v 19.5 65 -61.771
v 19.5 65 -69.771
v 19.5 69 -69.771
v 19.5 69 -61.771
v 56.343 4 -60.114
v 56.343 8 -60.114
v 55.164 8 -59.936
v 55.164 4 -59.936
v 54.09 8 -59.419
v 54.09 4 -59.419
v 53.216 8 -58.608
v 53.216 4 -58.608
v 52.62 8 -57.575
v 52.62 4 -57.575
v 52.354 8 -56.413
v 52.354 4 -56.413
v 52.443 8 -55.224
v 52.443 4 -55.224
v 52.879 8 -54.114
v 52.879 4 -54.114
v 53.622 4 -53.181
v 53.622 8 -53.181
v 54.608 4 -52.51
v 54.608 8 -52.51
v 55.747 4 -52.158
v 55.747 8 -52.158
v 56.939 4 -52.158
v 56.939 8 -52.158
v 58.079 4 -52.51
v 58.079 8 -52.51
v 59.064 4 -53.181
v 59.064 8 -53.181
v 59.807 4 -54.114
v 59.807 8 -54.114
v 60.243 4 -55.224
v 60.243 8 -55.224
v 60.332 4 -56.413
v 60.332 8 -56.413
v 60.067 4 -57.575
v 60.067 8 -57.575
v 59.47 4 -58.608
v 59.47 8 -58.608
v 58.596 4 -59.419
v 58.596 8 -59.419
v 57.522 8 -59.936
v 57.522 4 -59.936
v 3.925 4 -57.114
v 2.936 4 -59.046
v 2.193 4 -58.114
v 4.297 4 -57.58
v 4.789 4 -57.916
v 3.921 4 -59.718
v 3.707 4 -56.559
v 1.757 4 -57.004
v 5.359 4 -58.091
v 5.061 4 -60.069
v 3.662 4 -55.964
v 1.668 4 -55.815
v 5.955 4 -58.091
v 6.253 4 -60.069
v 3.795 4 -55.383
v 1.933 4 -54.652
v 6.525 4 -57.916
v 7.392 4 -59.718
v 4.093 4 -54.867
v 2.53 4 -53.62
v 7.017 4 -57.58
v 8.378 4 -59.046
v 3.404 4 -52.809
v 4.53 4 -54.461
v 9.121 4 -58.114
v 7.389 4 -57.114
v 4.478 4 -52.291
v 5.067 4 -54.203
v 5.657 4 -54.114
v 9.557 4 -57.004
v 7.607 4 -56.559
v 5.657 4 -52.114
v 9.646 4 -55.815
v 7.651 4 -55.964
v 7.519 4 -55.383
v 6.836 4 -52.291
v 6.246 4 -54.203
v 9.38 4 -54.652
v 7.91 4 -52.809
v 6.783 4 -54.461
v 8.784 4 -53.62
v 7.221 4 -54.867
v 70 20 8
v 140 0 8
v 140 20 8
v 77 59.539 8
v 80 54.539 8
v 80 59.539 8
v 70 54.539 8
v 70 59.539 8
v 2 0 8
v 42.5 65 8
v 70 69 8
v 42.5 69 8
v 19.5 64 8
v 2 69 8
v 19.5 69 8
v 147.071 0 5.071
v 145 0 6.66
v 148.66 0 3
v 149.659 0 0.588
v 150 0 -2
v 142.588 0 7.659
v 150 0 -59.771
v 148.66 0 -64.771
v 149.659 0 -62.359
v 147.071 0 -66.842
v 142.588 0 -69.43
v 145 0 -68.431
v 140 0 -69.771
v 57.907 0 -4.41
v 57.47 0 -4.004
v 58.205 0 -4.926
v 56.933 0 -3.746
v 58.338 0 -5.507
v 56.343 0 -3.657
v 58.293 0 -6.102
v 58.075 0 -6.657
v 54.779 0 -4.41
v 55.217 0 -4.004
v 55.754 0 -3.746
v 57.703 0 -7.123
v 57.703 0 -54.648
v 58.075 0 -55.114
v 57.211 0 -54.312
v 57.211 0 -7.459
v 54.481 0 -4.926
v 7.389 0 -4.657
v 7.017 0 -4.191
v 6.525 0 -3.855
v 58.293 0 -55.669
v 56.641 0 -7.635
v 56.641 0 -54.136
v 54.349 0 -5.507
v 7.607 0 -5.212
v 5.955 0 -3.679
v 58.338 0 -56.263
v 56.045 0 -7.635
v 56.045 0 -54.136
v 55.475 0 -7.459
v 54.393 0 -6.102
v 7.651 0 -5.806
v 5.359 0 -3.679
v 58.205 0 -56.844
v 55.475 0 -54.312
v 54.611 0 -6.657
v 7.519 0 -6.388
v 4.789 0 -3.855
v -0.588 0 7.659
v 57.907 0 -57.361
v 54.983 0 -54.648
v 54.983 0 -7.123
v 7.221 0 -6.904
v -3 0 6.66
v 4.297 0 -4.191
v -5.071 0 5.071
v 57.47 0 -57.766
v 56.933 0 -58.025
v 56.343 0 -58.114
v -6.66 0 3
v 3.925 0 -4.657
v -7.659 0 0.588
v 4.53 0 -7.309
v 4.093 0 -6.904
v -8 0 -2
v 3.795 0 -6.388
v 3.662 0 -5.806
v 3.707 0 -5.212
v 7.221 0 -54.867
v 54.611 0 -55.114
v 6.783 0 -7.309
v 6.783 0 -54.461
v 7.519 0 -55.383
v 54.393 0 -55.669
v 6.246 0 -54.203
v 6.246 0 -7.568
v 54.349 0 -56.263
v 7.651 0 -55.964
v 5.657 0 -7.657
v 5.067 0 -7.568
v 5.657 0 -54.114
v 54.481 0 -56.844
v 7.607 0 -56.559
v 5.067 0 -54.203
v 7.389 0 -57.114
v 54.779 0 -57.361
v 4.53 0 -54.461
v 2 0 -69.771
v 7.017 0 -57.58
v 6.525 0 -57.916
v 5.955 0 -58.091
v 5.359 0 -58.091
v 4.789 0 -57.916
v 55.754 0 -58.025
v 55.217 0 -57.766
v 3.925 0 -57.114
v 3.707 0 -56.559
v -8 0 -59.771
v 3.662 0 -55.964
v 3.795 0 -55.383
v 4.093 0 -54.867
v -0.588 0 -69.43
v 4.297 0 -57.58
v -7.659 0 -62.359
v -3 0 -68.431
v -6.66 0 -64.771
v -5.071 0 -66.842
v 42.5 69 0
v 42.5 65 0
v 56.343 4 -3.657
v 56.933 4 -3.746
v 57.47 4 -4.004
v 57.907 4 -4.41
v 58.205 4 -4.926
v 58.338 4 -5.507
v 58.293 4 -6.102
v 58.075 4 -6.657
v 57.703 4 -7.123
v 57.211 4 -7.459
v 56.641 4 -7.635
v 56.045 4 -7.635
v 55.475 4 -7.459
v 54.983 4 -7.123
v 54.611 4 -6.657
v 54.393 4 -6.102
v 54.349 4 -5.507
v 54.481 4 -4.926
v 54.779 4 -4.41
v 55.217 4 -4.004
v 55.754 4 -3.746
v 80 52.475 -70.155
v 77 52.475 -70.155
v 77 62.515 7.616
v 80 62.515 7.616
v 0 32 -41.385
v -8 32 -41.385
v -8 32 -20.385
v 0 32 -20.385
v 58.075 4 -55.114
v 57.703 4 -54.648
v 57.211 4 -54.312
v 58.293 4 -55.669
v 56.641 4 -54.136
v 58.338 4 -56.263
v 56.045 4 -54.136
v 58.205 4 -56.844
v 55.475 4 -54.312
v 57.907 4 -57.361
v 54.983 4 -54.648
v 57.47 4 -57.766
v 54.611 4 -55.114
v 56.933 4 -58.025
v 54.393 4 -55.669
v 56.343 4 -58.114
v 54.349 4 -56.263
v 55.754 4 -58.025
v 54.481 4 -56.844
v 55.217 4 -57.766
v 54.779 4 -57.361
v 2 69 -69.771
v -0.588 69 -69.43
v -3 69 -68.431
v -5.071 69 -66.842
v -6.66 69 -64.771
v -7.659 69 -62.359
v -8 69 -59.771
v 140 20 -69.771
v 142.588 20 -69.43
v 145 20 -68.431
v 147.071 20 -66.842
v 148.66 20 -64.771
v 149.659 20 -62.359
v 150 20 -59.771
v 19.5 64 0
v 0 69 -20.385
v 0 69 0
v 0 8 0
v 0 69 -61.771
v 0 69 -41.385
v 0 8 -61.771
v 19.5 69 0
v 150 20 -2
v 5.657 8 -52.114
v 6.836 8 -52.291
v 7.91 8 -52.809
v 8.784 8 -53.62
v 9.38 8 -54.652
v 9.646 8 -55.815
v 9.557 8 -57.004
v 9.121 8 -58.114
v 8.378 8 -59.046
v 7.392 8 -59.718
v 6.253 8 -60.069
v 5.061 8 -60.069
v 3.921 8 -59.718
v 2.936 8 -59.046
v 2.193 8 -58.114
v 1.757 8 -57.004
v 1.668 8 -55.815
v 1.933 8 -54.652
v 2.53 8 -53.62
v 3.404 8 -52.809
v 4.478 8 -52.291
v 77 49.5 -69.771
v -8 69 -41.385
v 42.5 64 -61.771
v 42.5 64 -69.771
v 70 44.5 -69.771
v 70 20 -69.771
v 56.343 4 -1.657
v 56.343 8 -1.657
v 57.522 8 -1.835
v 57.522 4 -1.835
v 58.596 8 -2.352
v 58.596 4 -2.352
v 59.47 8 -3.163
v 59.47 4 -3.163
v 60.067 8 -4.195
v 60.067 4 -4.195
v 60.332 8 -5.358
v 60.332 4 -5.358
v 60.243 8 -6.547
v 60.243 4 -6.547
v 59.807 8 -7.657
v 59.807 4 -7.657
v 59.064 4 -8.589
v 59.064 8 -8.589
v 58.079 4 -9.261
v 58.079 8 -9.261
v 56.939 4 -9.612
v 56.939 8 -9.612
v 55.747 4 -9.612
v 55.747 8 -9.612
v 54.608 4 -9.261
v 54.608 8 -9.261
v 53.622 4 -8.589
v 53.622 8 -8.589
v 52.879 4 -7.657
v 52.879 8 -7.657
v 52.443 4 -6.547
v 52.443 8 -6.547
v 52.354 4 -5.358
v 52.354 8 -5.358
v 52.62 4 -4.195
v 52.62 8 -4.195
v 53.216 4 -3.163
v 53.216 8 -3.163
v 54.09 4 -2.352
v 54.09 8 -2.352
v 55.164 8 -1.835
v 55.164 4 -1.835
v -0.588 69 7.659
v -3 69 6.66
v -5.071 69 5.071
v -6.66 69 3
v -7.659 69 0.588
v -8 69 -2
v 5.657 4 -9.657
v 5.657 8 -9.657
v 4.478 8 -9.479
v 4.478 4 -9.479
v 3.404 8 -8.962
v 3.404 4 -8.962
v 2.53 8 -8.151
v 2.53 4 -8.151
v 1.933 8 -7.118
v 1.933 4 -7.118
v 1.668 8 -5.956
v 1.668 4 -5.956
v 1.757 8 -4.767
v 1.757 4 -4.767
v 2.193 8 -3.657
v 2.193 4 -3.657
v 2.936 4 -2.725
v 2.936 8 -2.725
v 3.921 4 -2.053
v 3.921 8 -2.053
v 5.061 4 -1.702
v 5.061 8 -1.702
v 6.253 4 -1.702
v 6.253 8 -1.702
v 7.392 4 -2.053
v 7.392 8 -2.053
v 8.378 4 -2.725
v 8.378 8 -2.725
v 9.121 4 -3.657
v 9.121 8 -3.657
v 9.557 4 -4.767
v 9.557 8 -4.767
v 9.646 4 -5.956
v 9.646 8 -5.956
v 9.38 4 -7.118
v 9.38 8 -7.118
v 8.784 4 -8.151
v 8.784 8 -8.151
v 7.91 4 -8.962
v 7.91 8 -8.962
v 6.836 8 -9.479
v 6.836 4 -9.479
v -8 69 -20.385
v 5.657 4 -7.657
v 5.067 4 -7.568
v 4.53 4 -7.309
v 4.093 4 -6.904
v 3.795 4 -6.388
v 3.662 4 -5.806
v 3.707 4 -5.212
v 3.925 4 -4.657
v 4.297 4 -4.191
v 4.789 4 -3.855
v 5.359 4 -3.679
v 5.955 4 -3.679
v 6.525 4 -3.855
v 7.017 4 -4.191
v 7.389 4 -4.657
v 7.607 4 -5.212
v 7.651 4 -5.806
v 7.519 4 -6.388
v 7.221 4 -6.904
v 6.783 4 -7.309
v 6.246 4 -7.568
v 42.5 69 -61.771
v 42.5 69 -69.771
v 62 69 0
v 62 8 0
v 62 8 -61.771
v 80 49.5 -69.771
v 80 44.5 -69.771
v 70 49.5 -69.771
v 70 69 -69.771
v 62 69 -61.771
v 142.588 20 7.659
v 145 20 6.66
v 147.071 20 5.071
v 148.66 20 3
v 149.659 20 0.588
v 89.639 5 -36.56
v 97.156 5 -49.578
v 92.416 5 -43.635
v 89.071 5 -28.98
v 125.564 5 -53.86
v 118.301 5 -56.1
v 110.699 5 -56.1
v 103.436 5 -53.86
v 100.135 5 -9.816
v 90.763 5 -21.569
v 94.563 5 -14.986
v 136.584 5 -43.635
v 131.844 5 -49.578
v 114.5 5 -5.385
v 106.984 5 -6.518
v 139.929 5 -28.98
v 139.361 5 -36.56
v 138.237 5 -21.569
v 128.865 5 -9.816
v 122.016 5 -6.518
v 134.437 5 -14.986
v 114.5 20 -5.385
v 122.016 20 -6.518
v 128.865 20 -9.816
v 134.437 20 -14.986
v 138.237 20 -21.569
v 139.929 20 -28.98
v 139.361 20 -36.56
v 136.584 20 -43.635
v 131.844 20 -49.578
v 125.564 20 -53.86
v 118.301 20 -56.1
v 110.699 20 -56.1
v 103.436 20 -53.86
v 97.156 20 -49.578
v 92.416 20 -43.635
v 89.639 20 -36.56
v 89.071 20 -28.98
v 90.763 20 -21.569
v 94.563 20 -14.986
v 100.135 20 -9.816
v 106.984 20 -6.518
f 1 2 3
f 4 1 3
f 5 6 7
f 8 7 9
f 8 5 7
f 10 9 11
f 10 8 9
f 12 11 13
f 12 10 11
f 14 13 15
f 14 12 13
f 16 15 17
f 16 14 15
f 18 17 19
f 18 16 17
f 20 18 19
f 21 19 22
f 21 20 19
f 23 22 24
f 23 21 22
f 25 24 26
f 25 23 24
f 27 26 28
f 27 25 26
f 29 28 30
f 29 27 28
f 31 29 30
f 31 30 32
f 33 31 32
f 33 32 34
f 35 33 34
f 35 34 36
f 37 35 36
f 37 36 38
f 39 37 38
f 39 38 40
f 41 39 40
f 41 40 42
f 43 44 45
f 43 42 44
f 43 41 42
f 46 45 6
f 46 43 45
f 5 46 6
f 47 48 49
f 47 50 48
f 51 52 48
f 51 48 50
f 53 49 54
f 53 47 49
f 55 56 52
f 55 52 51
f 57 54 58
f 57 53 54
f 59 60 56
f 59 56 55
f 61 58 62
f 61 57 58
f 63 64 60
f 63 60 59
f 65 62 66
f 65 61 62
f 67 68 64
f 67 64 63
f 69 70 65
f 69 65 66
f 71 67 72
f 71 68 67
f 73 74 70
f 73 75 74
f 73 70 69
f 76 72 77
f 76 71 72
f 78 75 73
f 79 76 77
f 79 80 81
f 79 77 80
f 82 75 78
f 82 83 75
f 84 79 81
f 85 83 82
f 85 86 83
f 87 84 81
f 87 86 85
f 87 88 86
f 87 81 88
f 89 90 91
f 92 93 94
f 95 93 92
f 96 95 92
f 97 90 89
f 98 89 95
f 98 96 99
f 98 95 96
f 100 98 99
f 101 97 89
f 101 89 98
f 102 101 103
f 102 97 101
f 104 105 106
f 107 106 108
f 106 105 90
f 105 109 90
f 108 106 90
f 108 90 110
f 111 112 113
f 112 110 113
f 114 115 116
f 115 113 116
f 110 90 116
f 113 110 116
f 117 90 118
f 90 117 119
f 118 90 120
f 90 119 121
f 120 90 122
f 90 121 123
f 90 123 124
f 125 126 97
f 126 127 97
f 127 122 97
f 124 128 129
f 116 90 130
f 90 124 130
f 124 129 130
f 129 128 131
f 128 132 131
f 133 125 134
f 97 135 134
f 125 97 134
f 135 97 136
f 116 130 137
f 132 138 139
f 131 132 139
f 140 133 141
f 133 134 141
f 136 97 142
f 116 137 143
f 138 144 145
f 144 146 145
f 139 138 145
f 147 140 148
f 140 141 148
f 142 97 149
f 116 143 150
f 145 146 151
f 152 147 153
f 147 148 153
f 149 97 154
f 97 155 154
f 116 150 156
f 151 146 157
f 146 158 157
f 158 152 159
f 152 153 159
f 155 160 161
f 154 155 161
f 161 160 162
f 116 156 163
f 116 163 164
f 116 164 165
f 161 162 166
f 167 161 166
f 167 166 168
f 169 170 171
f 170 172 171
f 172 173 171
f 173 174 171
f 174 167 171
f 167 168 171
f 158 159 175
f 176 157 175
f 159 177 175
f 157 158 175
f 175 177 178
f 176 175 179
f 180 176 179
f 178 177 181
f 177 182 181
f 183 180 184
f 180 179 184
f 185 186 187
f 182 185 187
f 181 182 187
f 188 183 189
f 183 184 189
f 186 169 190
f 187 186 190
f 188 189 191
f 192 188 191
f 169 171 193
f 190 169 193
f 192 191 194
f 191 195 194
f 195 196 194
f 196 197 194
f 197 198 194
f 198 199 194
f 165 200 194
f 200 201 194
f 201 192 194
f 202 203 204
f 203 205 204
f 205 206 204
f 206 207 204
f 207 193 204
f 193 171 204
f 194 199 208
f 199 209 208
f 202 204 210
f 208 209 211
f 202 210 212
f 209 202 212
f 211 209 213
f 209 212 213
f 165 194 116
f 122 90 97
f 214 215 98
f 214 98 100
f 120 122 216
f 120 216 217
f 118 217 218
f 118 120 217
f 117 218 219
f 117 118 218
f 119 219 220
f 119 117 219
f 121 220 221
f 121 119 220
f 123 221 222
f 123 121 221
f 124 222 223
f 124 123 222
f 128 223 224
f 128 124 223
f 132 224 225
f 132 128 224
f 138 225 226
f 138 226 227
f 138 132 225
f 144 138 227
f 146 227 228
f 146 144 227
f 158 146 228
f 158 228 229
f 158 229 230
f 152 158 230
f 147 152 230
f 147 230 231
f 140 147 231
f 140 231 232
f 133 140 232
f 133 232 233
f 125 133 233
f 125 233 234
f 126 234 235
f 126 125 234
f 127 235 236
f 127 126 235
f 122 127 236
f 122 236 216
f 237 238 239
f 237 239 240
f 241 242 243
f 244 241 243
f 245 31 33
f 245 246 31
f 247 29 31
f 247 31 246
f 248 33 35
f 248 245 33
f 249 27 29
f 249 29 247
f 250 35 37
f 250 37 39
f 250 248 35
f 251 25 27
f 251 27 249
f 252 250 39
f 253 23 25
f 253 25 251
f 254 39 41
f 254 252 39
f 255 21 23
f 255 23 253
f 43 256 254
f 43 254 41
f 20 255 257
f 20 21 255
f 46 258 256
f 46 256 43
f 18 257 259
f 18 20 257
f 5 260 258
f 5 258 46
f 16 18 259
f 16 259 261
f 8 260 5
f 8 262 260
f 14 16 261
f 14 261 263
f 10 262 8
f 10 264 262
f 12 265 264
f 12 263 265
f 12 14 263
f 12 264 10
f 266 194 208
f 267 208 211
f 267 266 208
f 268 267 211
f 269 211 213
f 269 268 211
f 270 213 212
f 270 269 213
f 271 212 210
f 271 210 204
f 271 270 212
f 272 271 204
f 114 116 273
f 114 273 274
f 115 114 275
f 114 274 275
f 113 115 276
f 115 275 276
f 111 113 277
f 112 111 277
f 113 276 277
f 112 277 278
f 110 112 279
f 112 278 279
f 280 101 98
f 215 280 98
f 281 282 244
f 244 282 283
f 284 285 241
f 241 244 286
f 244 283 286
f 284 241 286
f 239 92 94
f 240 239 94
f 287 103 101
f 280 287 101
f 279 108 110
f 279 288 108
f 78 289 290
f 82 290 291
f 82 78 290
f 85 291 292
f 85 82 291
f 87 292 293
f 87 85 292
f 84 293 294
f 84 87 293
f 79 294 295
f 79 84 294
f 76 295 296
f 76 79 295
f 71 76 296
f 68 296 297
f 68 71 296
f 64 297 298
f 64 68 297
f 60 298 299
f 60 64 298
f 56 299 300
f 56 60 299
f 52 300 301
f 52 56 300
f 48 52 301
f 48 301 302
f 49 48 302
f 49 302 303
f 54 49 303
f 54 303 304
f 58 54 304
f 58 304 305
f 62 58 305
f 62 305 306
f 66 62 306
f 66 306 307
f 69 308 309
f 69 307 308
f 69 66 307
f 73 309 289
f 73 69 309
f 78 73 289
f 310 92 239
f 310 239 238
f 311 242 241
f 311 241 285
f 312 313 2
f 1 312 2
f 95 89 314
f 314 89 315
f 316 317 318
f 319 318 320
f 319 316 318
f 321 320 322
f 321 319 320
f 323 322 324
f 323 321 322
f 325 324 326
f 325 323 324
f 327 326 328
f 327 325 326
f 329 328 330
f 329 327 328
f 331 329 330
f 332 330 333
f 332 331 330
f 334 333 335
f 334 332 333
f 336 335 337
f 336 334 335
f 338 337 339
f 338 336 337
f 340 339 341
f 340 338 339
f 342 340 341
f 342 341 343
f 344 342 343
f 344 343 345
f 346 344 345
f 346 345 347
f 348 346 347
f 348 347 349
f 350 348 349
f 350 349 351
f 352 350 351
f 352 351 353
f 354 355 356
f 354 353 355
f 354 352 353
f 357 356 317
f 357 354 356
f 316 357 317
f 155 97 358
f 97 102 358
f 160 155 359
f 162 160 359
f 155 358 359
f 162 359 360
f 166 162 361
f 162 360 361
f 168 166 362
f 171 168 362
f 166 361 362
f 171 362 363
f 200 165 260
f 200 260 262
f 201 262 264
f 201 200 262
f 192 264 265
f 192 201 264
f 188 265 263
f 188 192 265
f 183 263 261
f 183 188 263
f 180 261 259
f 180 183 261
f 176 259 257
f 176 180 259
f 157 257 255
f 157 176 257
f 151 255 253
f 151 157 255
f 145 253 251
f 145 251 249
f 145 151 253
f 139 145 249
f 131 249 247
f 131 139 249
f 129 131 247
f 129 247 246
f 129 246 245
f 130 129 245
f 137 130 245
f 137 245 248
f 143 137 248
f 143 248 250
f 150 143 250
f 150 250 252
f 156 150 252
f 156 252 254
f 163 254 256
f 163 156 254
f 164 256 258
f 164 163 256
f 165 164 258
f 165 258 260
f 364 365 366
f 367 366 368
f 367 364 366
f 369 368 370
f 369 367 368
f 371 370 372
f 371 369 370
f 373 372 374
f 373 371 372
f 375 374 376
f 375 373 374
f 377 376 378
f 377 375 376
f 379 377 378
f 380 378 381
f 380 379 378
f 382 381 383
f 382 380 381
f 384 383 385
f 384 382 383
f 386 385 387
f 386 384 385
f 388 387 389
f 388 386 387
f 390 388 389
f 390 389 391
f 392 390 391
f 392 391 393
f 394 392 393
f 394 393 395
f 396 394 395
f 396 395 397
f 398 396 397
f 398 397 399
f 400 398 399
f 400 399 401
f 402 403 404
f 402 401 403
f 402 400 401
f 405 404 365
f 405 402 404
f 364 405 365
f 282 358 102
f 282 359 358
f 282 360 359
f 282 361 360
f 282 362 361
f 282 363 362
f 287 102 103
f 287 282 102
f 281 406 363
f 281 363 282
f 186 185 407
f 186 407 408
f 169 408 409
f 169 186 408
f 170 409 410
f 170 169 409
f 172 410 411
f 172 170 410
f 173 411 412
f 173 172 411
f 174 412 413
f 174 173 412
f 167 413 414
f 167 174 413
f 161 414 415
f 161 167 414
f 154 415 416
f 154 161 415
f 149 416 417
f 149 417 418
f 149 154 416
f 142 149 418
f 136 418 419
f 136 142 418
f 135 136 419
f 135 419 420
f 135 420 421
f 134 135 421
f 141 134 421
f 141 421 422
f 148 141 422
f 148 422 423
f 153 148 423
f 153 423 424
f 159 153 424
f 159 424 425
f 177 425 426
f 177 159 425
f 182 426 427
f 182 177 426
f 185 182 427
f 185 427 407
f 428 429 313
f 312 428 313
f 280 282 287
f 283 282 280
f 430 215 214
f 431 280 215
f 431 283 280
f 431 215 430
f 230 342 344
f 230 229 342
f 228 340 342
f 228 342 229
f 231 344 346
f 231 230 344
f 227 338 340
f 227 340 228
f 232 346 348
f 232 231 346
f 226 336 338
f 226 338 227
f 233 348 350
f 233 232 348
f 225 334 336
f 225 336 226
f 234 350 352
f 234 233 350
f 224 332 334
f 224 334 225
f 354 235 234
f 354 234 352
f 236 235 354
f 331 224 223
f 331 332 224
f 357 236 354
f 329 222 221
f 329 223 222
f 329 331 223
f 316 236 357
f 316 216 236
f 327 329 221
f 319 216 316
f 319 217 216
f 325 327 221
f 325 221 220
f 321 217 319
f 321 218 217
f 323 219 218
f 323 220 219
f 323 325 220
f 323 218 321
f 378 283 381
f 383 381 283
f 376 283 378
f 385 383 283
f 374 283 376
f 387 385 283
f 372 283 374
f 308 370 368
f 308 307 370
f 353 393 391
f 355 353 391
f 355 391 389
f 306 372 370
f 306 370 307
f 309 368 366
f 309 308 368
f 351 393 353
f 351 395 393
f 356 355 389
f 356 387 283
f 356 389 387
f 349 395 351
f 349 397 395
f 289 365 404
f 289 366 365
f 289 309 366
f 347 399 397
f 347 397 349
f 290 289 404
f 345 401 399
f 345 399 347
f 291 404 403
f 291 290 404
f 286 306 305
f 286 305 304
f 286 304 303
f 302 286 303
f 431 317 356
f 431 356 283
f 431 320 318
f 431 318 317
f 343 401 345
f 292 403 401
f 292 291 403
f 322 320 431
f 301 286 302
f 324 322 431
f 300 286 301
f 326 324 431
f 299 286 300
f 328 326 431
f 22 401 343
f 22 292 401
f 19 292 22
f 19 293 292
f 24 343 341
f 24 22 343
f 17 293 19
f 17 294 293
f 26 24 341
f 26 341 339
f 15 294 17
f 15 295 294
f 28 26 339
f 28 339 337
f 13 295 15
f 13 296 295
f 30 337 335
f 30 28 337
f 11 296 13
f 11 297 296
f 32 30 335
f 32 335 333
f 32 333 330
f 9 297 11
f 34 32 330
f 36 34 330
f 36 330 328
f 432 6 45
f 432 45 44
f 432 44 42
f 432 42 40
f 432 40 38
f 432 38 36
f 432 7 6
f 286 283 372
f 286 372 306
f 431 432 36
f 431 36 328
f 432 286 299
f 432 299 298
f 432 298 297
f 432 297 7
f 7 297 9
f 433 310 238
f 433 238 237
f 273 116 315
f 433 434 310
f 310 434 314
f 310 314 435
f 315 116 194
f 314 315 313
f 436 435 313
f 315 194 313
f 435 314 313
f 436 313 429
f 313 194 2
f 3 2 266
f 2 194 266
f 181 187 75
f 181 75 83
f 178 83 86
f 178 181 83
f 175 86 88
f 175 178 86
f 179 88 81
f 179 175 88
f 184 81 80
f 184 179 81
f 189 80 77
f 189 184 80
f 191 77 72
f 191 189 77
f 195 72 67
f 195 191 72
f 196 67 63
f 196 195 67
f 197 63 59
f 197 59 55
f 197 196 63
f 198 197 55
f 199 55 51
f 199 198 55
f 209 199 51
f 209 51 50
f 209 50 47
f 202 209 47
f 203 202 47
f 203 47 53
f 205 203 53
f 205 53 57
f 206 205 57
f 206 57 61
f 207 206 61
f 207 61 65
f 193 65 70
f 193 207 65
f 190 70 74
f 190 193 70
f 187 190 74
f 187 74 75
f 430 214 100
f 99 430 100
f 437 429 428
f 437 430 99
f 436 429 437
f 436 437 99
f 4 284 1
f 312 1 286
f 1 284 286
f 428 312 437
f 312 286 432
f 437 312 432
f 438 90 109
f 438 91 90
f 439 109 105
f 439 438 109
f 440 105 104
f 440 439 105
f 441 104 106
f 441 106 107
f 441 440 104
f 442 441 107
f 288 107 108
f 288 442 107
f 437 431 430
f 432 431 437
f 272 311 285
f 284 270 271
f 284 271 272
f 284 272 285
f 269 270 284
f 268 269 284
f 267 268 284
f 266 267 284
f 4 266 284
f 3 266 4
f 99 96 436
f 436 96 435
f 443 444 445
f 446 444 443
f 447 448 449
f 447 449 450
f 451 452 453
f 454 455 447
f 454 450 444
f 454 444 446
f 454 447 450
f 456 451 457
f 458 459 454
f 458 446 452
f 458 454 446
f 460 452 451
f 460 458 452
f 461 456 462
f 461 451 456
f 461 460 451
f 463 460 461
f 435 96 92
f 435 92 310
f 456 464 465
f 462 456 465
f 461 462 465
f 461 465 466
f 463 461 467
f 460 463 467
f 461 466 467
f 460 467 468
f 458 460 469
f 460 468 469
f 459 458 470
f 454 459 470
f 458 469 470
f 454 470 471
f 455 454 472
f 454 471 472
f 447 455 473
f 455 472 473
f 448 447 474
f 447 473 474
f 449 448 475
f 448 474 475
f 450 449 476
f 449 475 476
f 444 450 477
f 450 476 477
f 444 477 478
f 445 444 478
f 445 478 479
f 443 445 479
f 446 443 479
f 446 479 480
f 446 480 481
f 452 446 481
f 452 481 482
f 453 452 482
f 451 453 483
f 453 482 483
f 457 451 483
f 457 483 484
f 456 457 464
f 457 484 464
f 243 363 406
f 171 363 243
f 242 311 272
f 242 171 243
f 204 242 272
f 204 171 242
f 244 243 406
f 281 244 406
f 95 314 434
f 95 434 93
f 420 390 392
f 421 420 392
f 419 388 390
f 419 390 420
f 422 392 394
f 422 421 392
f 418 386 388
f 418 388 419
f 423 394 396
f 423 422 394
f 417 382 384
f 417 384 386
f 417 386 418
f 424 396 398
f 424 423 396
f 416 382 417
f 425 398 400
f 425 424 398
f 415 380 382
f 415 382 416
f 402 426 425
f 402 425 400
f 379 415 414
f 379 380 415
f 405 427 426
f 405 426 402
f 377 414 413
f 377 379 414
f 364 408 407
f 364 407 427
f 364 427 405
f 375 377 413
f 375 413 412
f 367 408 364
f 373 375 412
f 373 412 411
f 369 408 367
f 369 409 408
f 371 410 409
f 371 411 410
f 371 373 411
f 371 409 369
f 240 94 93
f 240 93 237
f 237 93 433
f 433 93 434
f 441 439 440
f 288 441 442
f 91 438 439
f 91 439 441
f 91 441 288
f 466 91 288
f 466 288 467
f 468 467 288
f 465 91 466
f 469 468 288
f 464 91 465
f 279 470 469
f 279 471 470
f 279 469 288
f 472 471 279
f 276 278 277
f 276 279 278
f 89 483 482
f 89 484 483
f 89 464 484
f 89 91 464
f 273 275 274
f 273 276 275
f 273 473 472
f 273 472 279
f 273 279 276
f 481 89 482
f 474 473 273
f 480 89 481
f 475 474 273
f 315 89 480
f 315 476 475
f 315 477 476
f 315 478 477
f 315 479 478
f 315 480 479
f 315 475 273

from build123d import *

# Parameters (mm, degrees)
SKETCH1_W            = 62
SKETCH1_H            = 61.770504471
BOSS_EXTRUDE6_DEPTH  = 8
SKETCH1_15_W         = 78
SKETCH1_15_H         = 77.770504471
SKETCH1_15_W_2       = 62
SKETCH1_15_H_2       = 61.770504471
BOSS_EXTRUDE9_DEPTH  = 69
SKETCH1_17_R         = 4
CUT_EXTRUDE2_DEPTH   = 56
SKETCH1_18_R         = 4
SKETCH1_18_R_2       = 2
BOSS_EXTRUDE10_DEPTH = 4
CUT_EXTRUDE10_DEPTH  = 8
CUT_EXTRUDE11_DEPTH  = 8
SKETCH6_W            = 21
SKETCH6_H            = 37
CUT_EXTRUDE13_DEPTH  = 10
SKETCH12_W           = 77.770504471
SKETCH12_H           = 20
BOSS_EXTRUDE12_DEPTH = 80
BOSS_EXTRUDE13_DEPTH = 10
SKETCH14_W           = 3
SKETCH14_H           = 78.415811308
BOSS_EXTRUDE14_DEPTH = 3
SKETCH15_R           = 25.5
CUT_EXTRUDE14_DEPTH  = 15
FILLET1_R            = 10


with BuildPart() as part:
    # Sketch1 → Boss-Extrude6 (new body)
    with BuildSketch(Plane(origin=(0, 0, 0), x_dir=(1, 0, 0), z_dir=(0, 1, 0))):
        with Locations((31, 30.885252236)):
            Rectangle(SKETCH1_W, SKETCH1_H)
    extrude(amount=BOSS_EXTRUDE6_DEPTH)

    # Sketch1<15> → Boss-Extrude9 (add)
    with BuildSketch(Plane(origin=(0, 0, 0), x_dir=(1, 0, 0), z_dir=(0, 1, 0))):
        with Locations((31, 30.885252236)):
            Rectangle(SKETCH1_15_W, SKETCH1_15_H)
        with Locations((31, 30.885252236)):
            Rectangle(SKETCH1_15_W_2, SKETCH1_15_H_2, mode=Mode.SUBTRACT)
    extrude(amount=BOSS_EXTRUDE9_DEPTH)

    # Sketch1<17> → Cut-Extrude2 (cut)
    with BuildSketch(Plane(origin=(0, 0, 0), x_dir=(1, 0, 0), z_dir=(0, 1, 0))):
        with Locations((5.656854249, 56.113650222)):
            Circle(SKETCH1_17_R)
        with Locations((56.343145751, 56.113650222)):
            Circle(SKETCH1_17_R)
        with Locations((56.343145751, 5.656854249)):
            Circle(SKETCH1_17_R)
        with Locations((5.656854249, 5.656854249)):
            Circle(SKETCH1_17_R)
    extrude(amount=CUT_EXTRUDE2_DEPTH, mode=Mode.SUBTRACT)

    # Sketch1<18> → Boss-Extrude10 (add)
    # profile 1 of 4: a face of its own
    with BuildSketch(Plane(origin=(0, 0, 0), x_dir=(1, 0, 0), z_dir=(0, 1, 0))):
        with Locations((5.656854249, 56.113650222)):
            Circle(SKETCH1_18_R)
        with Locations((5.656854249, 56.113650222)):
            Circle(SKETCH1_18_R_2, mode=Mode.SUBTRACT)
    # profile 2 of 4: a face of its own
    with BuildSketch(Plane(origin=(0, 0, 0), x_dir=(1, 0, 0), z_dir=(0, 1, 0))):
        with Locations((56.343145751, 56.113650222)):
            Circle(SKETCH1_18_R)
        with Locations((56.343145751, 56.113650222)):
            Circle(SKETCH1_18_R_2, mode=Mode.SUBTRACT)
    # profile 3 of 4: a face of its own
    with BuildSketch(Plane(origin=(0, 0, 0), x_dir=(1, 0, 0), z_dir=(0, 1, 0))):
        with Locations((56.343145751, 5.656854249)):
            Circle(SKETCH1_18_R)
        with Locations((56.343145751, 5.656854249)):
            Circle(SKETCH1_18_R_2, mode=Mode.SUBTRACT)
    # profile 4 of 4: a face of its own
    with BuildSketch(Plane(origin=(0, 0, 0), x_dir=(1, 0, 0), z_dir=(0, 1, 0))):
        with Locations((5.656854249, 5.656854249)):
            Circle(SKETCH1_18_R)
        with Locations((5.656854249, 5.656854249)):
            Circle(SKETCH1_18_R_2, mode=Mode.SUBTRACT)
    extrude(amount=BOSS_EXTRUDE10_DEPTH)

    # Sketch3 → Cut-Extrude10 (cut)
    with BuildSketch(Plane(origin=(0, 0, -69.770504471), x_dir=(-1, 0, 0), z_dir=(0, 0, -1))):
        Polygon((-42.5, 69), (-42.5, 64), (-19.5, 65), (-19.5, 69), align=None)
    extrude(amount=-CUT_EXTRUDE10_DEPTH, mode=Mode.SUBTRACT)

    # Sketch9 → Cut-Extrude11 (cut)
    with BuildSketch(Plane.XY.offset(8)):
        Polygon((19.5, 69), (19.5, 64), (42.5, 65), (42.5, 69), align=None)
    extrude(amount=-CUT_EXTRUDE11_DEPTH, mode=Mode.SUBTRACT)

    # Sketch6 → Cut-Extrude13 (cut)
    with BuildSketch(Plane.ZY.offset(8)):
        with Locations((-30.885252236, 50.5)):
            Rectangle(SKETCH6_W, SKETCH6_H)
    extrude(amount=-CUT_EXTRUDE13_DEPTH, mode=Mode.SUBTRACT)

    # Sketch12 → Boss-Extrude12 (add)
    with BuildSketch(Plane(origin=(70, 0, 0), x_dir=(0, 0, -1), z_dir=(1, 0, 0))):
        with Locations((30.885252236, 10)):
            Rectangle(SKETCH12_W, SKETCH12_H)
    extrude(amount=BOSS_EXTRUDE12_DEPTH)

    # Sketch13 → Boss-Extrude13 (add)
    with BuildSketch(Plane(origin=(70, 0, 0), x_dir=(0, 0, -1), z_dir=(1, 0, 0))):
        Polygon((-8, 59.539327542), (69.770504471, 49.5), (69.770504471, 44.5), (-8, 54.539327542), align=None)
    extrude(amount=BOSS_EXTRUDE13_DEPTH)

    # Sketch14 → Boss-Extrude14 (add)
    with BuildSketch(Plane(origin=(0, 57.547640196, -7.428775384), x_dir=(1, 0, 0), z_dir=(0, 0.9917707050815963, -0.12802682743063418))):
        with Locations((78.5, 23.651108801)):
            Rectangle(SKETCH14_W, SKETCH14_H)
    extrude(amount=BOSS_EXTRUDE14_DEPTH)

    # Sketch15 → Cut-Extrude14 (cut)
    with BuildSketch(Plane(origin=(0, 20, 0), x_dir=(1, 0, 0), z_dir=(0, 1, 0))):
        with Locations((114.5, 30.885252236)):
            Circle(SKETCH15_R)
    extrude(amount=-CUT_EXTRUDE14_DEPTH, mode=Mode.SUBTRACT)

    # Fillet1
    fillet1_edges = [part.edges().sort_by_distance(p)[0] for p in [
        (-8, 34.5, -69.770504471),
        (-8, 34.5, 8),
        (150, 10, -69.770504471),
        (150, 10, 8),
    ]]
    fillet(fillet1_edges, radius=FILLET1_R)


solid = part.part
